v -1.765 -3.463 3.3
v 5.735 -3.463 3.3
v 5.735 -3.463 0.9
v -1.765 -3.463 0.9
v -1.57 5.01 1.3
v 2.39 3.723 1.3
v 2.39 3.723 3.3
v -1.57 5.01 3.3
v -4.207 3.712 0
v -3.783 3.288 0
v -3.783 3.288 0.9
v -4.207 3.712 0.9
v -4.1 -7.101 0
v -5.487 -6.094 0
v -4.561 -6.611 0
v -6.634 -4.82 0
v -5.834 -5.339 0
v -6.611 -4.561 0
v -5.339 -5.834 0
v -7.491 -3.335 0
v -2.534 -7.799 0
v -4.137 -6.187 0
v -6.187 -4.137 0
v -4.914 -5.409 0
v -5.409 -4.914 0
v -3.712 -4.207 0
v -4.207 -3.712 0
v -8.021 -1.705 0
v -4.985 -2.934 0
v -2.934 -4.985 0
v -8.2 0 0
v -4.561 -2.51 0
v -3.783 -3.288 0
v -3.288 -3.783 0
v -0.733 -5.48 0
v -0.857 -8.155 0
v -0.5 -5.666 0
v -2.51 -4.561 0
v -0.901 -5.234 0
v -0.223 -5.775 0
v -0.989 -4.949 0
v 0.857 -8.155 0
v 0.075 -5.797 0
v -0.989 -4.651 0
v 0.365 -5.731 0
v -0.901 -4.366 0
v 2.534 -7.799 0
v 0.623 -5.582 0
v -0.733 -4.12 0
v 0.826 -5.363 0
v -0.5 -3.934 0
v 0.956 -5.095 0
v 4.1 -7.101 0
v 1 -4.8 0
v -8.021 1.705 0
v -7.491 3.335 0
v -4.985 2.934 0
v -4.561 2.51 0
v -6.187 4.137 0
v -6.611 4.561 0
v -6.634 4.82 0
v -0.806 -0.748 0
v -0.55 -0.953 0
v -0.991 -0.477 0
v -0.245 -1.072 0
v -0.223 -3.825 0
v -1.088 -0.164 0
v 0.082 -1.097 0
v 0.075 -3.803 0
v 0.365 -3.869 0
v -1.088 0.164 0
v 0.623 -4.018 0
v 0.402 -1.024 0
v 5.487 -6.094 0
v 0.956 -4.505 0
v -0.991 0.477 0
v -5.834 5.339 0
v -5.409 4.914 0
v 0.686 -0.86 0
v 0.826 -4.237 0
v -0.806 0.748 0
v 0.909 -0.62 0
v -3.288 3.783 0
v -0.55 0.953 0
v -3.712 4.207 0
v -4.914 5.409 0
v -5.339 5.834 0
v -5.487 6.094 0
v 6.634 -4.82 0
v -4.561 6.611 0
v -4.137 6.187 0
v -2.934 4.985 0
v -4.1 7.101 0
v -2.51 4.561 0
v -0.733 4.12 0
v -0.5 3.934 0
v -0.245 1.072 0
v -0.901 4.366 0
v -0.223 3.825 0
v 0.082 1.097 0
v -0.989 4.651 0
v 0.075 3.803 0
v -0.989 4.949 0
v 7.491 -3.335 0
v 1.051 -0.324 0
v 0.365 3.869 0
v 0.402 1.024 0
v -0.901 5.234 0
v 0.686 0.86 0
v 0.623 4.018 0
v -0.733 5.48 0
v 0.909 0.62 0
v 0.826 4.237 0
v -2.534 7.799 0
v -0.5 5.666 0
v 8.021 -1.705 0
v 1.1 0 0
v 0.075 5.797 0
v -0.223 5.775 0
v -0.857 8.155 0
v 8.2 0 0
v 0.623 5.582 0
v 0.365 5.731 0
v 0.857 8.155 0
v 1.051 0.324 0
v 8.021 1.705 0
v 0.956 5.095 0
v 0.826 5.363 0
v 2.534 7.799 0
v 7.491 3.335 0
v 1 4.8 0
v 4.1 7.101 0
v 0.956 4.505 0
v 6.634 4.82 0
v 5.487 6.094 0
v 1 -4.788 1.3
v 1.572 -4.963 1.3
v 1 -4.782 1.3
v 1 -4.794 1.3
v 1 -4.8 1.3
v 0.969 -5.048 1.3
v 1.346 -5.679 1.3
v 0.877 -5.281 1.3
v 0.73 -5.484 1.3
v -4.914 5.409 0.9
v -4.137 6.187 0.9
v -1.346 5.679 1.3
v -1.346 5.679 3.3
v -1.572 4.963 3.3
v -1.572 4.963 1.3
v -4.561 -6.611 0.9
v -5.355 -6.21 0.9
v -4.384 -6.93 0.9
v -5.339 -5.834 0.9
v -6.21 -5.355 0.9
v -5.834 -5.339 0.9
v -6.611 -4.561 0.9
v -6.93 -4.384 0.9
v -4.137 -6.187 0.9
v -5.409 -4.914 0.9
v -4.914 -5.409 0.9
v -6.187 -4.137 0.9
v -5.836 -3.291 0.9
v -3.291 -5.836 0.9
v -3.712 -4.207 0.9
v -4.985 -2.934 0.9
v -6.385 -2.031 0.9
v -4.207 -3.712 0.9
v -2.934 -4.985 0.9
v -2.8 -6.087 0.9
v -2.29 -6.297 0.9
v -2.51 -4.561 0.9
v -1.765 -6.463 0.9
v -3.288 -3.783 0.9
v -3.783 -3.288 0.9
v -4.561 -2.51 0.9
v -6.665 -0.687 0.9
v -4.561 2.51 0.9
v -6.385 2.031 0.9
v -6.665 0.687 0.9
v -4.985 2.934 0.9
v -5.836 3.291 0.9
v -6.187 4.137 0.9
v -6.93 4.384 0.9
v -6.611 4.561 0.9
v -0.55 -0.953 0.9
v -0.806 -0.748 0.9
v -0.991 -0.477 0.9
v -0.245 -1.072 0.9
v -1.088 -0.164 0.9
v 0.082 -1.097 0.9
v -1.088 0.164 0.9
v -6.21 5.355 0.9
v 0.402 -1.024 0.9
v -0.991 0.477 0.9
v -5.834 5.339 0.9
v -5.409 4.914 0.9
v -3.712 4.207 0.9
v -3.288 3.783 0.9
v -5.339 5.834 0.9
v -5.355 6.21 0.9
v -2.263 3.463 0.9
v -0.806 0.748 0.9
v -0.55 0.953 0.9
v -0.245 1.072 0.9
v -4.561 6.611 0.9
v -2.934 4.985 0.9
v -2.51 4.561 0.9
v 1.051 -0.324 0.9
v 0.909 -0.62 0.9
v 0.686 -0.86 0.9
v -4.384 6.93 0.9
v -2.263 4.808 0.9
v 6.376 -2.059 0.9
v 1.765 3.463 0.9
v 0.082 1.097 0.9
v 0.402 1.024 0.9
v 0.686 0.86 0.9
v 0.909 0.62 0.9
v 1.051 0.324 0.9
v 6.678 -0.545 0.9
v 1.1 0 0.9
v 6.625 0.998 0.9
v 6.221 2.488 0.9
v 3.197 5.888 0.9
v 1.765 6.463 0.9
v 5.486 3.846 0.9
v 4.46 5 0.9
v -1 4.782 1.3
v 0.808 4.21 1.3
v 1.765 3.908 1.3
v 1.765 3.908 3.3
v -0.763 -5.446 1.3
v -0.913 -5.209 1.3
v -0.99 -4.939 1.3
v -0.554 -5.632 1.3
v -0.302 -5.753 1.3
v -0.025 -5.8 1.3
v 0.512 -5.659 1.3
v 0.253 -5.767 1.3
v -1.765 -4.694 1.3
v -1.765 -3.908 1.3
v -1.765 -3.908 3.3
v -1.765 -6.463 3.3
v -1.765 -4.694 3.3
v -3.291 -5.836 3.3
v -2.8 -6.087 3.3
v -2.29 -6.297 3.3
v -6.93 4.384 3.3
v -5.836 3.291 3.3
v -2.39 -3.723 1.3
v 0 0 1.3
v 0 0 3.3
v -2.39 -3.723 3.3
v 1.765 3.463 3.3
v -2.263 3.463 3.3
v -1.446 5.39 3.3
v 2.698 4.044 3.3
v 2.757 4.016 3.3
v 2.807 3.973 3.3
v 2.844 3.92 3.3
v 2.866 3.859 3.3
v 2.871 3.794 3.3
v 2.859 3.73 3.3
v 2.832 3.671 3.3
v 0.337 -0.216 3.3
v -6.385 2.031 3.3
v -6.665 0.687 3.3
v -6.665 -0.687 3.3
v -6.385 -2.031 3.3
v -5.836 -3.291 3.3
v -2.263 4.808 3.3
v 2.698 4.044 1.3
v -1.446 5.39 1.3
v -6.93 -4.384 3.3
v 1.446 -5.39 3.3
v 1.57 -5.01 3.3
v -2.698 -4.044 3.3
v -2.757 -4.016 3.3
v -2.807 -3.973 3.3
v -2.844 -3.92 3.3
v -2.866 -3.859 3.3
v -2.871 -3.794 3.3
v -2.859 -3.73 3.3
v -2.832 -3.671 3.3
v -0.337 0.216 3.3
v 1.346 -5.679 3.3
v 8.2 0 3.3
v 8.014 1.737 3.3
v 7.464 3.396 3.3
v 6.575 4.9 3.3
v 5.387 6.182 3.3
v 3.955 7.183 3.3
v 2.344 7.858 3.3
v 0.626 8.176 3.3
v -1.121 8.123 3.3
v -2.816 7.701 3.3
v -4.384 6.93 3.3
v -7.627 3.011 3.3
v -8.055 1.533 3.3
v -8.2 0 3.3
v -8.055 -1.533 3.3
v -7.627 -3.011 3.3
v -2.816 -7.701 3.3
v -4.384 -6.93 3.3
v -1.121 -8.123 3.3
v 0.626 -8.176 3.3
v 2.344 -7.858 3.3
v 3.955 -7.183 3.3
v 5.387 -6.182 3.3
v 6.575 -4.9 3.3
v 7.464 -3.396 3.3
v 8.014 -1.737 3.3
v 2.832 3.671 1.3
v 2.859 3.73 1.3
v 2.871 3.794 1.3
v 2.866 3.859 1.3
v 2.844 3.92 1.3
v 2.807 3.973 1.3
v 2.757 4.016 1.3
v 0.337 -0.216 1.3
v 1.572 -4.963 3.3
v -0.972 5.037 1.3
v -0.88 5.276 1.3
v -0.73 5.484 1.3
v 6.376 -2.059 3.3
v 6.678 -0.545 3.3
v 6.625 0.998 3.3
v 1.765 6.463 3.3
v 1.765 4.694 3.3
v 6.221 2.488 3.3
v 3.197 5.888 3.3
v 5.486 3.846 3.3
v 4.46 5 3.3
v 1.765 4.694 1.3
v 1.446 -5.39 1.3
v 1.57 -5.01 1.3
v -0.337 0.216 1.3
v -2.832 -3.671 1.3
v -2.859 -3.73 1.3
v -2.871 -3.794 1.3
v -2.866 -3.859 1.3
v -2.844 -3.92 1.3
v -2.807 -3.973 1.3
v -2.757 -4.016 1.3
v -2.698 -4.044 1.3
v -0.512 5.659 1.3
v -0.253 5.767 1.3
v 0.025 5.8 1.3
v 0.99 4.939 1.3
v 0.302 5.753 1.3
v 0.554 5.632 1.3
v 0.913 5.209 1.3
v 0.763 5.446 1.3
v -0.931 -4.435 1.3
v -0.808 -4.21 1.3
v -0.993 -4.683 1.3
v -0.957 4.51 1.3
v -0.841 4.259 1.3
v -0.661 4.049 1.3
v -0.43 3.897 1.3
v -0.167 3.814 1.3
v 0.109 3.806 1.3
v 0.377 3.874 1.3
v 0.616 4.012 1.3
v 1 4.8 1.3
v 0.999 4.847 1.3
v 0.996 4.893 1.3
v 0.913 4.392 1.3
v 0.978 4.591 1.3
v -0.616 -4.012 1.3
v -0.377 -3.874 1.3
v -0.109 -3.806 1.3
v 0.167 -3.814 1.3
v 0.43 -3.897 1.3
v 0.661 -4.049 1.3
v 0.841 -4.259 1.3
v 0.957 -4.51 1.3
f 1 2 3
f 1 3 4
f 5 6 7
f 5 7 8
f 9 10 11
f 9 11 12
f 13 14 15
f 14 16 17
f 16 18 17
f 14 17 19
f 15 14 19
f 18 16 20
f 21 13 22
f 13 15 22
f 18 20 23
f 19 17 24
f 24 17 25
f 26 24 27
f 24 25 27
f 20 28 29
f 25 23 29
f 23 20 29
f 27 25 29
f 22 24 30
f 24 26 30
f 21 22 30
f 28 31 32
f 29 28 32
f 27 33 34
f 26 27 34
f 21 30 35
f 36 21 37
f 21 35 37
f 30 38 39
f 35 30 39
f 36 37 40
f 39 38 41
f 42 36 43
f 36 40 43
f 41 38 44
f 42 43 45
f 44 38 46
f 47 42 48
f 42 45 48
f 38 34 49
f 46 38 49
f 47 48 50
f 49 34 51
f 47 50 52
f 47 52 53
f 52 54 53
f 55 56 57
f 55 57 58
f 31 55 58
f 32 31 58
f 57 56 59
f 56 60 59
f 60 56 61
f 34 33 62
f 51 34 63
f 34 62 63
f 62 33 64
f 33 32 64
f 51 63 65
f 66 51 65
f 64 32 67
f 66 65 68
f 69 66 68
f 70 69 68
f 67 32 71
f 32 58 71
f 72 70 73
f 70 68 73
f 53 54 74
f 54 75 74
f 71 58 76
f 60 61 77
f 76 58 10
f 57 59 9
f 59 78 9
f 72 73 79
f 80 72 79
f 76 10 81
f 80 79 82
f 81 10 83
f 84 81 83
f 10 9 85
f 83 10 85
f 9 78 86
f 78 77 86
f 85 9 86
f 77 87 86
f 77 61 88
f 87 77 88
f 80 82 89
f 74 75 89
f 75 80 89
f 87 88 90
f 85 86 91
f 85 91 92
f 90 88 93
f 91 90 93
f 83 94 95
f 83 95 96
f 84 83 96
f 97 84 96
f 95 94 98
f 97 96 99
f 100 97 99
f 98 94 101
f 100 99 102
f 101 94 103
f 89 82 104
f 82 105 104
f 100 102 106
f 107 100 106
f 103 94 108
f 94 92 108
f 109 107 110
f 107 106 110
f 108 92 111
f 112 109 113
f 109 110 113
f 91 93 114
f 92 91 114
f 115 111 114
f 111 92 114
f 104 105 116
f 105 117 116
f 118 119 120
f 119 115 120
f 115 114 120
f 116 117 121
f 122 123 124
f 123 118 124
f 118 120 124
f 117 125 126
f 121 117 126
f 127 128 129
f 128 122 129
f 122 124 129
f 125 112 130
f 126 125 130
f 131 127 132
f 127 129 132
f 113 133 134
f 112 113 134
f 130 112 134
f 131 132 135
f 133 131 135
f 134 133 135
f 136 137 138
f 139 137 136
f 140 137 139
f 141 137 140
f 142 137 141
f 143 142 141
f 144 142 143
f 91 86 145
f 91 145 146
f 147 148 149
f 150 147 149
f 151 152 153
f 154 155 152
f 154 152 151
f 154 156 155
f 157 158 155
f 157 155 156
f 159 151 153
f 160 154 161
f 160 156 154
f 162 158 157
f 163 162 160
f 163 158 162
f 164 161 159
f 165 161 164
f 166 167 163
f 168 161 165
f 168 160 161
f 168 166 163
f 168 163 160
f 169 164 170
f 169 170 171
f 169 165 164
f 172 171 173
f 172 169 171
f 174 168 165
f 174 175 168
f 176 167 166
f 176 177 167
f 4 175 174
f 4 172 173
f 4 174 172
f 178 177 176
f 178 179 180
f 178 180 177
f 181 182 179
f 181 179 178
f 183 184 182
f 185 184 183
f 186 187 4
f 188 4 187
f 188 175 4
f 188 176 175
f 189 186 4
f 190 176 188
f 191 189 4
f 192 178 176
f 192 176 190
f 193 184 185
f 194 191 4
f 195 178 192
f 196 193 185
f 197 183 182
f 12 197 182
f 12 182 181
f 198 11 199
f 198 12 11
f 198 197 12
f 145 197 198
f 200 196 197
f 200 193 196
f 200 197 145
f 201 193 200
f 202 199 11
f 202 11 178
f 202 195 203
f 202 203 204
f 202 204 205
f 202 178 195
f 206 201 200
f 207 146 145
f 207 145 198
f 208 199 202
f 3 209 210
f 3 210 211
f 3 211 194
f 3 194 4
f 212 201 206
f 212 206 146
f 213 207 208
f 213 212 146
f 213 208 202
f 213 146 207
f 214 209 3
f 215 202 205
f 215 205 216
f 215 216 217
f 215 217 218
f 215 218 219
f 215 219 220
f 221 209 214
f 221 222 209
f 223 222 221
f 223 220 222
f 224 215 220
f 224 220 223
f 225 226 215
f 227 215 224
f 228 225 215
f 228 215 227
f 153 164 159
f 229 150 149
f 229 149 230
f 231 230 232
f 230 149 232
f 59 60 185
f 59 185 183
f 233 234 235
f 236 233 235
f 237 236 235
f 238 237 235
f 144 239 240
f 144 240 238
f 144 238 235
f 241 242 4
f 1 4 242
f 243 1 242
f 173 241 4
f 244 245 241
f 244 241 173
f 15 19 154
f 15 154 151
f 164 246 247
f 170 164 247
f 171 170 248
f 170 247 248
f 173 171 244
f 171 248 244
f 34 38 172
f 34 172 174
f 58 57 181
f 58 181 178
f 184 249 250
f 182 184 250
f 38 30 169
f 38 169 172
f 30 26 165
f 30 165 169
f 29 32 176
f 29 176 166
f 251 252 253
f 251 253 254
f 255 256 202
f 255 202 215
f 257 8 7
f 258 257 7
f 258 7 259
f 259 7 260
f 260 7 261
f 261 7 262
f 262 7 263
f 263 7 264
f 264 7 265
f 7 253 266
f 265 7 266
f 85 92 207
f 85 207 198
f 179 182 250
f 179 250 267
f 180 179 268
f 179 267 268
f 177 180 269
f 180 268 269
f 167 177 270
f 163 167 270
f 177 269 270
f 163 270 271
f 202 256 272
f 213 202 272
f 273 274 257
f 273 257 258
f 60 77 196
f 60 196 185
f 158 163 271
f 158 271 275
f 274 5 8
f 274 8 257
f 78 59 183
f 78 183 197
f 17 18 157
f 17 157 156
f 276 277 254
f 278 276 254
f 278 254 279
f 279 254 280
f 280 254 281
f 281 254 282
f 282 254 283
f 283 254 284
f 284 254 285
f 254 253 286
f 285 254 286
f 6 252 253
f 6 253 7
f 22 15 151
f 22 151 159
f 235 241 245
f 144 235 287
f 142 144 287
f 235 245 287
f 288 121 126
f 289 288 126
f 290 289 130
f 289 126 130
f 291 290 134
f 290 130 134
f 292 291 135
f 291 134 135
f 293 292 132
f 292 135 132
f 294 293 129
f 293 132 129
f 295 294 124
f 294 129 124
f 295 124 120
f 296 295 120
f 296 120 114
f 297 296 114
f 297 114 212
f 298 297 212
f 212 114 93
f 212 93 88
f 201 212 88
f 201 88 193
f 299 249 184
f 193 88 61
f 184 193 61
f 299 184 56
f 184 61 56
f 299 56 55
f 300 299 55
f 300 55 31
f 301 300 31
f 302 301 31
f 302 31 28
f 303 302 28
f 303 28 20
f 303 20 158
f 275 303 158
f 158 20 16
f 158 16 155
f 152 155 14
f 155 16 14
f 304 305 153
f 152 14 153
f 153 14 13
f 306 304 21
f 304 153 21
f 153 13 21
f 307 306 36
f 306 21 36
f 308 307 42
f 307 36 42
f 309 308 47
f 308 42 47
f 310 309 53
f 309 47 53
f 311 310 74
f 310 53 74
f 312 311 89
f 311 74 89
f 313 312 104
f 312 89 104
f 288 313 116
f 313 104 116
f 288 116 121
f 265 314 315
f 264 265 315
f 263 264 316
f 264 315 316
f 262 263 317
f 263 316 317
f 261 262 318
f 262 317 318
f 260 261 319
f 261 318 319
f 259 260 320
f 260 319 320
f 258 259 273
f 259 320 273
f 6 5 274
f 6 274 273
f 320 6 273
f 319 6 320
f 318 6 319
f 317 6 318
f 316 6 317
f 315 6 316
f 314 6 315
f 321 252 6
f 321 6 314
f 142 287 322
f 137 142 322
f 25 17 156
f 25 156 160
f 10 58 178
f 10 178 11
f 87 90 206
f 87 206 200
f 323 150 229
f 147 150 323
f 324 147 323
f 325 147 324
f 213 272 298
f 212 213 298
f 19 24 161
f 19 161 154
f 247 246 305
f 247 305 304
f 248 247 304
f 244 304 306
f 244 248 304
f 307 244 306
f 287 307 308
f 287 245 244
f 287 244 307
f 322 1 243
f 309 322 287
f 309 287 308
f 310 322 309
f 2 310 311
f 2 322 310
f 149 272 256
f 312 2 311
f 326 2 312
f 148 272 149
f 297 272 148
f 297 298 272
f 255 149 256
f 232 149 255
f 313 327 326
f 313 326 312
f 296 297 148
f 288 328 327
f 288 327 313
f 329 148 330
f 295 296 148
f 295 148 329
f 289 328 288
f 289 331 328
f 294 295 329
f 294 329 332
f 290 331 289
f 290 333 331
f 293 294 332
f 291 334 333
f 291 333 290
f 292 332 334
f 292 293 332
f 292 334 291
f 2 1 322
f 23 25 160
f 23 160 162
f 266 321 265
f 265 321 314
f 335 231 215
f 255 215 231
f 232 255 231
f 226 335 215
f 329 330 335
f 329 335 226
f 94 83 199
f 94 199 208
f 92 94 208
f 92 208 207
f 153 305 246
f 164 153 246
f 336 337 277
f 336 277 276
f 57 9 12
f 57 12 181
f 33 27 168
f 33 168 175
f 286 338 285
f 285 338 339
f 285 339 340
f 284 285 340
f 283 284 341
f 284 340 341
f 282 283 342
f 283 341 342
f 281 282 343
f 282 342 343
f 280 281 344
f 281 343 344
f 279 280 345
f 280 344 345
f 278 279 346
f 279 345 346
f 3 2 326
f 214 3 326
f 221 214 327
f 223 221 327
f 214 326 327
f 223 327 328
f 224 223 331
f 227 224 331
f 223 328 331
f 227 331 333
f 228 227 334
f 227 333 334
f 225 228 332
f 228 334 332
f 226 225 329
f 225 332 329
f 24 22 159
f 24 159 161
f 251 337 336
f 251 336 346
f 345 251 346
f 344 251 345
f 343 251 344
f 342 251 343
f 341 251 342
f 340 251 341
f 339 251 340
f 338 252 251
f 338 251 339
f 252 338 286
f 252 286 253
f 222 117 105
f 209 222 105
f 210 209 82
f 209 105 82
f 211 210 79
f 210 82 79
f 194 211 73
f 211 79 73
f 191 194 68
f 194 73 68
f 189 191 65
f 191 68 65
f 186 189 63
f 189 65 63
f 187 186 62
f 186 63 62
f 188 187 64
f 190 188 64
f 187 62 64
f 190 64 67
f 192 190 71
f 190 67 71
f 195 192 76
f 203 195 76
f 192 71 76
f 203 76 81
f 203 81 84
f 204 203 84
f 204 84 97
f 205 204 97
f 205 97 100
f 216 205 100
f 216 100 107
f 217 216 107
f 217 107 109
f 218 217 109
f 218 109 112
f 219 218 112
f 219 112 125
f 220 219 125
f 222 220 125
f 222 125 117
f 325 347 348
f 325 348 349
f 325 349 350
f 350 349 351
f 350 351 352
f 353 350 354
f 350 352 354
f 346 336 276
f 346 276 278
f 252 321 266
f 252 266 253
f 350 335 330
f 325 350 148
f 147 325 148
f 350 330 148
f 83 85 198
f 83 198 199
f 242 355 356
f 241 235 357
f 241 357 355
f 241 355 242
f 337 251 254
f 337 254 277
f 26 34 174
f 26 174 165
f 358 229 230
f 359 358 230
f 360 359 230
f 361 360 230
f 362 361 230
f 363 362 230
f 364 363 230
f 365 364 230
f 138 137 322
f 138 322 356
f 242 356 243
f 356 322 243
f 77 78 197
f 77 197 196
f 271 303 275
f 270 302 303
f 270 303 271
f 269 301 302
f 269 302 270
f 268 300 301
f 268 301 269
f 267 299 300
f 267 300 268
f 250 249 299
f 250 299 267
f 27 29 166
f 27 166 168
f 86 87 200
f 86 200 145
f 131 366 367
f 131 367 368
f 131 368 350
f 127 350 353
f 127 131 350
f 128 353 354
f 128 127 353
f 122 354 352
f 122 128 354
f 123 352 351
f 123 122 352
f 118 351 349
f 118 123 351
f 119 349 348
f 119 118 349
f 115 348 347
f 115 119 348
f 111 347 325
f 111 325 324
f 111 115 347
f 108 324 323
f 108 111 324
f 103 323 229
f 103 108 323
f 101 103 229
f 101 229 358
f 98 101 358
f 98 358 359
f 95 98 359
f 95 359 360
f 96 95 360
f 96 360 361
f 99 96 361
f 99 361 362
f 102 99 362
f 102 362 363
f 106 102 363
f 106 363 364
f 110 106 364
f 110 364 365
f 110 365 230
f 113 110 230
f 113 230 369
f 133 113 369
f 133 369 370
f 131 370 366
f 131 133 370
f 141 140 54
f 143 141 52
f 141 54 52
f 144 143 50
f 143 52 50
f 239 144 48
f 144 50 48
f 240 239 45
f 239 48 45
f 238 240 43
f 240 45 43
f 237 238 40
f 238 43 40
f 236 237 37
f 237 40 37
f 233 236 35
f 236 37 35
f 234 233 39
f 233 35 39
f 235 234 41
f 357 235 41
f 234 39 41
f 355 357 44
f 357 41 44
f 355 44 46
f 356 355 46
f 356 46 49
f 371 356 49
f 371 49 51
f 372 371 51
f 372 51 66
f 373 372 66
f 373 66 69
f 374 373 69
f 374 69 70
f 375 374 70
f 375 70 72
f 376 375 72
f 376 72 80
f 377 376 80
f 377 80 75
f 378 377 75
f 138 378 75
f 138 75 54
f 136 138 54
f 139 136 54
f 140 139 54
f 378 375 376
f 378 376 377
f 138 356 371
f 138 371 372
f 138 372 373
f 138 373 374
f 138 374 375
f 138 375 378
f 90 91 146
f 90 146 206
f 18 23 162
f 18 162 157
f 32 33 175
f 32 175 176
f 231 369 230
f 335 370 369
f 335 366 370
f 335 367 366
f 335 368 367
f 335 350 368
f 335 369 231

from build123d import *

# Parameters (mm, degrees)
SKETCH_R                = 8.2
PAD_DEPTH               = 3.3
POCKET_DEPTH            = 2.4
POCKET001_DEPTH         = 2
POLARPATTERN_COUNT      = 2
POCKET002_DEPTH         = 2.4
SKETCH006_R             = 1.1
POCKET003_DEPTH         = 3.301
POCKET004_DEPTH         = 50.154388
POLARPATTERN001_COUNT   = 2
POLARPATTERN001_ANGLE   = 90
SKETCH008_R             = 1
POCKET005_DEPTH         = 1.3
SKETCH009_W             = 1.344882
SKETCH009_H             = 1.344882
POCKET006_DEPTH         = 2.4
PAD001_DEPTH            = 2
PAD002_DEPTH            = 2
BODY002_PLACEMENT_ANGLE = 180


with BuildPart() as lid:
    # Sketch → Pad (new body)
    with BuildSketch(Plane.XY):
        Circle(SKETCH_R)
    extrude(amount=PAD_DEPTH)

    # Sketch001 (on Face3 of Pad) → Pocket (cut)
    with BuildSketch(Plane.XY.offset(3.3)):
        with BuildLine():
            ThreePointArc((5.735378, -3.463444), (6.220794, 2.488318), (1.764622, 6.463444))
            Line((1.764622, 3.463444), (1.764622, 6.463444))
            Line((-5.735378, 3.463444), (1.764622, 3.463444))
            ThreePointArc((-5.735378, 3.463444), (-6.220794, -2.488318), (-1.764622, -6.463444))
            Line((-1.764622, -3.463444), (-1.764622, -6.463444))
            Line((5.735378, -3.463444), (-1.764622, -3.463444))
        make_face()
    extrude(amount=-POCKET_DEPTH, mode=Mode.SUBTRACT)

    # Sketch002 (on Face3 of Pocket) → Pocket001 (cut)
    with BuildSketch(Plane.XY.offset(3.3)):
        Polygon((-1.572379, 4.963444), (1.764622, 3.907783), (1.764622, 4.694417), (-1.346166, 5.678516), align=None)
    pocket001 = extrude(amount=-POCKET001_DEPTH, mode=Mode.SUBTRACT)

    # PolarPattern: Pocket001 ×2 about axis
    polarpattern_axis = Axis((0, 0, 3.3), (0, 0, 1))
    for i in range(1, POLARPATTERN_COUNT):
        add(pocket001.rotate(polarpattern_axis, i * 360 / POLARPATTERN_COUNT), mode=Mode.SUBTRACT)

    # Sketch003 (on Face3 of PolarPattern) → Pocket002 (cut)
    with BuildSketch(Plane.XY.offset(3.3)):
        Polygon((-2.262742, -4.808326), (-4.808326, -2.262742), (-6.929646, -4.384062), (-7.636753, -5.091169), (-5.091169, -7.636753), (-4.384062, -6.929646), align=None)
        Polygon((-4.808326, 2.262742), (-2.262742, 4.808326), (-4.384062, 6.929646), (-5.091169, 7.636753), (-7.636753, 5.091169), (-6.929646, 4.384062), align=None)
    extrude(amount=-POCKET002_DEPTH, mode=Mode.SUBTRACT)

    # Sketch006 (on Face2 of Pocket002) → Pocket003 (cut, through all)
    with BuildSketch(Plane(origin=(0, 0, 0), x_dir=(1, 0, 0), z_dir=(0, 0, -1))):
        Circle(SKETCH006_R)
    extrude(amount=-POCKET003_DEPTH, mode=Mode.SUBTRACT)

    # Sketch007 → Pocket004 (cut, through all)
    with BuildSketch(Plane.XY):
        Polygon((-4.560839, -2.510229), (-4.985103, -2.934493), (-4.207285, -3.712311), (-3.783021, -3.288047), align=None)
        Polygon((-3.712311, -4.207285), (-2.934493, -4.985103), (-2.510229, -4.560839), (-3.288047, -3.783021), align=None)
        Polygon((-5.338656, -5.833631), (-4.560839, -6.611448), (-4.136575, -6.187184), (-4.914392, -5.409367), align=None)
        Polygon((-6.611448, -4.560839), (-5.833631, -5.338656), (-5.409367, -4.914392), (-6.187184, -4.136575), align=None)
    pocket004 = extrude(amount=POCKET004_DEPTH, mode=Mode.SUBTRACT)

    # PolarPattern001: Pocket004 ×2 about axis
    polarpattern001_axis = Axis((0, 0, 0), (0, 0, -1))
    for i in range(1, POLARPATTERN001_COUNT):
        add(pocket004.rotate(polarpattern001_axis, i * POLARPATTERN001_ANGLE / (POLARPATTERN001_COUNT - 1)), mode=Mode.SUBTRACT)

    # Sketch008 → Pocket005 (cut)
    with BuildSketch(Plane.XY):
        with Locations((0, 4.8)):
            Circle(SKETCH008_R)
    pocket005 = extrude(amount=POCKET005_DEPTH, mode=Mode.SUBTRACT)

    # Mirrored: Pocket005 across XZ
    add(pocket005.mirror(Plane.XZ), mode=Mode.SUBTRACT)

    # Sketch009 (on Face3 of Mirrored) → Pocket006 (cut)
    with BuildSketch(Plane.XY.offset(3.3)):
        with Locations((-2.935183, 4.135885)):
            Rectangle(SKETCH009_W, SKETCH009_H)
    extrude(amount=-POCKET006_DEPTH, mode=Mode.SUBTRACT)


with BuildPart() as body001:
    # Sketch004 → Pad001 (new body)
    with BuildSketch(Plane.XY):
        with BuildLine():
            Line((0, 0), (-2.389976, -3.723326))
            Line((-2.389976, -3.723326), (1.57, -5.01))
            Line((1.57, -5.01), (1.446393, -5.390423))
            Line((1.446393, -5.390423), (-2.698481, -4.043671))
            ThreePointArc((-2.831614, -3.670861), (-2.856665, -3.889984), (-2.698481, -4.043671))
            Line((-0.336619, 0.216073), (-2.831614, -3.670861))
            Line((-0.336619, 0.216073), (0, 0))
        make_face()
    extrude(amount=PAD001_DEPTH)


with BuildPart() as body001_1:
    # Body001 placement: moved
    add(body001.part.moved(Location((0, 0, 1.3))))


with BuildPart() as body002:
    # Sketch005 → Pad002 (new body)
    with BuildSketch(Plane.XY):
        with BuildLine():
            Line((0, 0), (-2.389976, -3.723326))
            Line((-2.389976, -3.723326), (1.57, -5.01))
            Line((1.57, -5.01), (1.446393, -5.390423))
            Line((1.446393, -5.390423), (-2.698481, -4.043671))
            ThreePointArc((-2.831614, -3.670861), (-2.856665, -3.889984), (-2.698481, -4.043671))
            Line((-0.336619, 0.216073), (-2.831614, -3.670861))
            Line((-0.336619, 0.216073), (0, 0))
        make_face()
    extrude(amount=PAD002_DEPTH)


with BuildPart() as body002_1:
    # Body002 placement: moved
    add(body002.part.moved(Location((0, 0, 1.3))).rotate(Axis((0, 0, 1.3), (0, 0, 1)), BODY002_PLACEMENT_ANGLE))


solid = Compound([lid.part, body001_1.part, body002_1.part])
